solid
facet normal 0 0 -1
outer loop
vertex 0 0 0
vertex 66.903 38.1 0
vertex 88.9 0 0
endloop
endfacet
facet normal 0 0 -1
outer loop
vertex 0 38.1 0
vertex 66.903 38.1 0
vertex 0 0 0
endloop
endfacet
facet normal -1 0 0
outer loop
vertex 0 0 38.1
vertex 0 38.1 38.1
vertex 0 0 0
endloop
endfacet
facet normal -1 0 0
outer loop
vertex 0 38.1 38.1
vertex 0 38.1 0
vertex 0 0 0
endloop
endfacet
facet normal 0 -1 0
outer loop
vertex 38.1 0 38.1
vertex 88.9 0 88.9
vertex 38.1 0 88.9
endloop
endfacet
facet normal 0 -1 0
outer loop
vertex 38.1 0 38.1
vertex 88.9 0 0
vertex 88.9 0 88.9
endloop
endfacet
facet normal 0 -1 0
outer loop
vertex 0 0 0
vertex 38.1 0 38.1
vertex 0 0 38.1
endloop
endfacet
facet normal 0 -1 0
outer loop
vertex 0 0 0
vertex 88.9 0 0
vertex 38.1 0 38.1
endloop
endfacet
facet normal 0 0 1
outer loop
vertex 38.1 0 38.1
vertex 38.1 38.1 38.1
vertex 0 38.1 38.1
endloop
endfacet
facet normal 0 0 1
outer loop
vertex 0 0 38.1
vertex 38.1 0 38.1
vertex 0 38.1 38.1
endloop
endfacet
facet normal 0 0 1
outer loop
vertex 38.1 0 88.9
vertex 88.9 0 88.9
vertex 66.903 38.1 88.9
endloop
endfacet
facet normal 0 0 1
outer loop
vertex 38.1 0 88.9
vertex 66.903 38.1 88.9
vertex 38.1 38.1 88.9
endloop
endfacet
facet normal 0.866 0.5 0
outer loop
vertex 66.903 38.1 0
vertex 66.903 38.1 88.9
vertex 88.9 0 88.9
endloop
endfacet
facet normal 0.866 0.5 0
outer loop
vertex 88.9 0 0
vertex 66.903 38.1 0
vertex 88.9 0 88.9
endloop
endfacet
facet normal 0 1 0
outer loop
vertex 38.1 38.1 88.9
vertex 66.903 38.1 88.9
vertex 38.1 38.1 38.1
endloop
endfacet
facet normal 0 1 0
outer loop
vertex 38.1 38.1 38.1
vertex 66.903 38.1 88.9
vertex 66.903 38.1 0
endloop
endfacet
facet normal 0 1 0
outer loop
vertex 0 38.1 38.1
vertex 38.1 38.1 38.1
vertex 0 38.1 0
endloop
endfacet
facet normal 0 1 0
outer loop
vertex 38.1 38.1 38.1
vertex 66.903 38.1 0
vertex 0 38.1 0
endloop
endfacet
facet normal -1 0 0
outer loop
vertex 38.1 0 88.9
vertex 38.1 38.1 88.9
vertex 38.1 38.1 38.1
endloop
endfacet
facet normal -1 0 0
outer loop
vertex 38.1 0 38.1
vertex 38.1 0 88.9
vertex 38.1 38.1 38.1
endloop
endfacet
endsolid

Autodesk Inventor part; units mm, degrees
ref_plane "YZ Plane" through (0, 0, 0) normal (1, 0, 0) x (0, 1, 0)
ref_plane "XZ Plane" through (0, 0, 0) normal (0, 1, 0) x (-1, 0, 0)
ref_plane "XY Plane" through (0, 0, 0) normal (0, 0, 1) x (1, 0, 0)
sketch "Sketch1" plane through (0, 0, 0) normal (0, 0, 1) x (1, 0, 0)
  line L0 (0, 0) -> (66.903, 0)
  line L1 (66.903, 0) -> (66.903, 38.1)
  line L2 (66.903, 38.1) -> (0, 38.1)
  line L3 (0, 38.1) -> (0, 0)
  dimension "d0" = 66.903
  dimension "d1" = 38.1
extrude "Extrusion1" add sketch "Sketch1" along normal blind 88.9
sketch "Sketch2" plane through (0, 38.1, 0) normal (0, 1, 0) x (1, 0, 0)
  line L0 (0, -88.9) -> (66.903, -88.9) projected
  line L1 (0, -88.9) -> (38.1, -88.9)
  line L2 (38.1, -88.9) -> (38.1, -38.1)
  line L3 (38.1, -38.1) -> (0, -38.1)
  line L4 (0, -38.1) -> (0, -88.9)
  point P0 (0, 0)
  dimension "d4" = 38.1
  dimension "d5" = 50.8
extrude "Extrusion2" cut sketch "Sketch2" against normal through all
sketch "Sketch3" plane through (0, 0, 0) normal (0, 0, -1) x (-1, 0, 0)
  line L0 (-66.903, 38.1) -> (0, 38.1) projected
  line L1 (-66.903, 38.1) -> (-88.9, 0)
  line L2 (-88.9, 0) -> (-66.903, 0)
  line L3 (-66.903, 0) -> (-66.903, 38.1)
  point P0 (0, 0)
  dimension "d8" = 60
extrude "Extrusion3" add sketch "Sketch3" against normal blind 88.9
properties part number "BO04" material "Wood (Oak)"
